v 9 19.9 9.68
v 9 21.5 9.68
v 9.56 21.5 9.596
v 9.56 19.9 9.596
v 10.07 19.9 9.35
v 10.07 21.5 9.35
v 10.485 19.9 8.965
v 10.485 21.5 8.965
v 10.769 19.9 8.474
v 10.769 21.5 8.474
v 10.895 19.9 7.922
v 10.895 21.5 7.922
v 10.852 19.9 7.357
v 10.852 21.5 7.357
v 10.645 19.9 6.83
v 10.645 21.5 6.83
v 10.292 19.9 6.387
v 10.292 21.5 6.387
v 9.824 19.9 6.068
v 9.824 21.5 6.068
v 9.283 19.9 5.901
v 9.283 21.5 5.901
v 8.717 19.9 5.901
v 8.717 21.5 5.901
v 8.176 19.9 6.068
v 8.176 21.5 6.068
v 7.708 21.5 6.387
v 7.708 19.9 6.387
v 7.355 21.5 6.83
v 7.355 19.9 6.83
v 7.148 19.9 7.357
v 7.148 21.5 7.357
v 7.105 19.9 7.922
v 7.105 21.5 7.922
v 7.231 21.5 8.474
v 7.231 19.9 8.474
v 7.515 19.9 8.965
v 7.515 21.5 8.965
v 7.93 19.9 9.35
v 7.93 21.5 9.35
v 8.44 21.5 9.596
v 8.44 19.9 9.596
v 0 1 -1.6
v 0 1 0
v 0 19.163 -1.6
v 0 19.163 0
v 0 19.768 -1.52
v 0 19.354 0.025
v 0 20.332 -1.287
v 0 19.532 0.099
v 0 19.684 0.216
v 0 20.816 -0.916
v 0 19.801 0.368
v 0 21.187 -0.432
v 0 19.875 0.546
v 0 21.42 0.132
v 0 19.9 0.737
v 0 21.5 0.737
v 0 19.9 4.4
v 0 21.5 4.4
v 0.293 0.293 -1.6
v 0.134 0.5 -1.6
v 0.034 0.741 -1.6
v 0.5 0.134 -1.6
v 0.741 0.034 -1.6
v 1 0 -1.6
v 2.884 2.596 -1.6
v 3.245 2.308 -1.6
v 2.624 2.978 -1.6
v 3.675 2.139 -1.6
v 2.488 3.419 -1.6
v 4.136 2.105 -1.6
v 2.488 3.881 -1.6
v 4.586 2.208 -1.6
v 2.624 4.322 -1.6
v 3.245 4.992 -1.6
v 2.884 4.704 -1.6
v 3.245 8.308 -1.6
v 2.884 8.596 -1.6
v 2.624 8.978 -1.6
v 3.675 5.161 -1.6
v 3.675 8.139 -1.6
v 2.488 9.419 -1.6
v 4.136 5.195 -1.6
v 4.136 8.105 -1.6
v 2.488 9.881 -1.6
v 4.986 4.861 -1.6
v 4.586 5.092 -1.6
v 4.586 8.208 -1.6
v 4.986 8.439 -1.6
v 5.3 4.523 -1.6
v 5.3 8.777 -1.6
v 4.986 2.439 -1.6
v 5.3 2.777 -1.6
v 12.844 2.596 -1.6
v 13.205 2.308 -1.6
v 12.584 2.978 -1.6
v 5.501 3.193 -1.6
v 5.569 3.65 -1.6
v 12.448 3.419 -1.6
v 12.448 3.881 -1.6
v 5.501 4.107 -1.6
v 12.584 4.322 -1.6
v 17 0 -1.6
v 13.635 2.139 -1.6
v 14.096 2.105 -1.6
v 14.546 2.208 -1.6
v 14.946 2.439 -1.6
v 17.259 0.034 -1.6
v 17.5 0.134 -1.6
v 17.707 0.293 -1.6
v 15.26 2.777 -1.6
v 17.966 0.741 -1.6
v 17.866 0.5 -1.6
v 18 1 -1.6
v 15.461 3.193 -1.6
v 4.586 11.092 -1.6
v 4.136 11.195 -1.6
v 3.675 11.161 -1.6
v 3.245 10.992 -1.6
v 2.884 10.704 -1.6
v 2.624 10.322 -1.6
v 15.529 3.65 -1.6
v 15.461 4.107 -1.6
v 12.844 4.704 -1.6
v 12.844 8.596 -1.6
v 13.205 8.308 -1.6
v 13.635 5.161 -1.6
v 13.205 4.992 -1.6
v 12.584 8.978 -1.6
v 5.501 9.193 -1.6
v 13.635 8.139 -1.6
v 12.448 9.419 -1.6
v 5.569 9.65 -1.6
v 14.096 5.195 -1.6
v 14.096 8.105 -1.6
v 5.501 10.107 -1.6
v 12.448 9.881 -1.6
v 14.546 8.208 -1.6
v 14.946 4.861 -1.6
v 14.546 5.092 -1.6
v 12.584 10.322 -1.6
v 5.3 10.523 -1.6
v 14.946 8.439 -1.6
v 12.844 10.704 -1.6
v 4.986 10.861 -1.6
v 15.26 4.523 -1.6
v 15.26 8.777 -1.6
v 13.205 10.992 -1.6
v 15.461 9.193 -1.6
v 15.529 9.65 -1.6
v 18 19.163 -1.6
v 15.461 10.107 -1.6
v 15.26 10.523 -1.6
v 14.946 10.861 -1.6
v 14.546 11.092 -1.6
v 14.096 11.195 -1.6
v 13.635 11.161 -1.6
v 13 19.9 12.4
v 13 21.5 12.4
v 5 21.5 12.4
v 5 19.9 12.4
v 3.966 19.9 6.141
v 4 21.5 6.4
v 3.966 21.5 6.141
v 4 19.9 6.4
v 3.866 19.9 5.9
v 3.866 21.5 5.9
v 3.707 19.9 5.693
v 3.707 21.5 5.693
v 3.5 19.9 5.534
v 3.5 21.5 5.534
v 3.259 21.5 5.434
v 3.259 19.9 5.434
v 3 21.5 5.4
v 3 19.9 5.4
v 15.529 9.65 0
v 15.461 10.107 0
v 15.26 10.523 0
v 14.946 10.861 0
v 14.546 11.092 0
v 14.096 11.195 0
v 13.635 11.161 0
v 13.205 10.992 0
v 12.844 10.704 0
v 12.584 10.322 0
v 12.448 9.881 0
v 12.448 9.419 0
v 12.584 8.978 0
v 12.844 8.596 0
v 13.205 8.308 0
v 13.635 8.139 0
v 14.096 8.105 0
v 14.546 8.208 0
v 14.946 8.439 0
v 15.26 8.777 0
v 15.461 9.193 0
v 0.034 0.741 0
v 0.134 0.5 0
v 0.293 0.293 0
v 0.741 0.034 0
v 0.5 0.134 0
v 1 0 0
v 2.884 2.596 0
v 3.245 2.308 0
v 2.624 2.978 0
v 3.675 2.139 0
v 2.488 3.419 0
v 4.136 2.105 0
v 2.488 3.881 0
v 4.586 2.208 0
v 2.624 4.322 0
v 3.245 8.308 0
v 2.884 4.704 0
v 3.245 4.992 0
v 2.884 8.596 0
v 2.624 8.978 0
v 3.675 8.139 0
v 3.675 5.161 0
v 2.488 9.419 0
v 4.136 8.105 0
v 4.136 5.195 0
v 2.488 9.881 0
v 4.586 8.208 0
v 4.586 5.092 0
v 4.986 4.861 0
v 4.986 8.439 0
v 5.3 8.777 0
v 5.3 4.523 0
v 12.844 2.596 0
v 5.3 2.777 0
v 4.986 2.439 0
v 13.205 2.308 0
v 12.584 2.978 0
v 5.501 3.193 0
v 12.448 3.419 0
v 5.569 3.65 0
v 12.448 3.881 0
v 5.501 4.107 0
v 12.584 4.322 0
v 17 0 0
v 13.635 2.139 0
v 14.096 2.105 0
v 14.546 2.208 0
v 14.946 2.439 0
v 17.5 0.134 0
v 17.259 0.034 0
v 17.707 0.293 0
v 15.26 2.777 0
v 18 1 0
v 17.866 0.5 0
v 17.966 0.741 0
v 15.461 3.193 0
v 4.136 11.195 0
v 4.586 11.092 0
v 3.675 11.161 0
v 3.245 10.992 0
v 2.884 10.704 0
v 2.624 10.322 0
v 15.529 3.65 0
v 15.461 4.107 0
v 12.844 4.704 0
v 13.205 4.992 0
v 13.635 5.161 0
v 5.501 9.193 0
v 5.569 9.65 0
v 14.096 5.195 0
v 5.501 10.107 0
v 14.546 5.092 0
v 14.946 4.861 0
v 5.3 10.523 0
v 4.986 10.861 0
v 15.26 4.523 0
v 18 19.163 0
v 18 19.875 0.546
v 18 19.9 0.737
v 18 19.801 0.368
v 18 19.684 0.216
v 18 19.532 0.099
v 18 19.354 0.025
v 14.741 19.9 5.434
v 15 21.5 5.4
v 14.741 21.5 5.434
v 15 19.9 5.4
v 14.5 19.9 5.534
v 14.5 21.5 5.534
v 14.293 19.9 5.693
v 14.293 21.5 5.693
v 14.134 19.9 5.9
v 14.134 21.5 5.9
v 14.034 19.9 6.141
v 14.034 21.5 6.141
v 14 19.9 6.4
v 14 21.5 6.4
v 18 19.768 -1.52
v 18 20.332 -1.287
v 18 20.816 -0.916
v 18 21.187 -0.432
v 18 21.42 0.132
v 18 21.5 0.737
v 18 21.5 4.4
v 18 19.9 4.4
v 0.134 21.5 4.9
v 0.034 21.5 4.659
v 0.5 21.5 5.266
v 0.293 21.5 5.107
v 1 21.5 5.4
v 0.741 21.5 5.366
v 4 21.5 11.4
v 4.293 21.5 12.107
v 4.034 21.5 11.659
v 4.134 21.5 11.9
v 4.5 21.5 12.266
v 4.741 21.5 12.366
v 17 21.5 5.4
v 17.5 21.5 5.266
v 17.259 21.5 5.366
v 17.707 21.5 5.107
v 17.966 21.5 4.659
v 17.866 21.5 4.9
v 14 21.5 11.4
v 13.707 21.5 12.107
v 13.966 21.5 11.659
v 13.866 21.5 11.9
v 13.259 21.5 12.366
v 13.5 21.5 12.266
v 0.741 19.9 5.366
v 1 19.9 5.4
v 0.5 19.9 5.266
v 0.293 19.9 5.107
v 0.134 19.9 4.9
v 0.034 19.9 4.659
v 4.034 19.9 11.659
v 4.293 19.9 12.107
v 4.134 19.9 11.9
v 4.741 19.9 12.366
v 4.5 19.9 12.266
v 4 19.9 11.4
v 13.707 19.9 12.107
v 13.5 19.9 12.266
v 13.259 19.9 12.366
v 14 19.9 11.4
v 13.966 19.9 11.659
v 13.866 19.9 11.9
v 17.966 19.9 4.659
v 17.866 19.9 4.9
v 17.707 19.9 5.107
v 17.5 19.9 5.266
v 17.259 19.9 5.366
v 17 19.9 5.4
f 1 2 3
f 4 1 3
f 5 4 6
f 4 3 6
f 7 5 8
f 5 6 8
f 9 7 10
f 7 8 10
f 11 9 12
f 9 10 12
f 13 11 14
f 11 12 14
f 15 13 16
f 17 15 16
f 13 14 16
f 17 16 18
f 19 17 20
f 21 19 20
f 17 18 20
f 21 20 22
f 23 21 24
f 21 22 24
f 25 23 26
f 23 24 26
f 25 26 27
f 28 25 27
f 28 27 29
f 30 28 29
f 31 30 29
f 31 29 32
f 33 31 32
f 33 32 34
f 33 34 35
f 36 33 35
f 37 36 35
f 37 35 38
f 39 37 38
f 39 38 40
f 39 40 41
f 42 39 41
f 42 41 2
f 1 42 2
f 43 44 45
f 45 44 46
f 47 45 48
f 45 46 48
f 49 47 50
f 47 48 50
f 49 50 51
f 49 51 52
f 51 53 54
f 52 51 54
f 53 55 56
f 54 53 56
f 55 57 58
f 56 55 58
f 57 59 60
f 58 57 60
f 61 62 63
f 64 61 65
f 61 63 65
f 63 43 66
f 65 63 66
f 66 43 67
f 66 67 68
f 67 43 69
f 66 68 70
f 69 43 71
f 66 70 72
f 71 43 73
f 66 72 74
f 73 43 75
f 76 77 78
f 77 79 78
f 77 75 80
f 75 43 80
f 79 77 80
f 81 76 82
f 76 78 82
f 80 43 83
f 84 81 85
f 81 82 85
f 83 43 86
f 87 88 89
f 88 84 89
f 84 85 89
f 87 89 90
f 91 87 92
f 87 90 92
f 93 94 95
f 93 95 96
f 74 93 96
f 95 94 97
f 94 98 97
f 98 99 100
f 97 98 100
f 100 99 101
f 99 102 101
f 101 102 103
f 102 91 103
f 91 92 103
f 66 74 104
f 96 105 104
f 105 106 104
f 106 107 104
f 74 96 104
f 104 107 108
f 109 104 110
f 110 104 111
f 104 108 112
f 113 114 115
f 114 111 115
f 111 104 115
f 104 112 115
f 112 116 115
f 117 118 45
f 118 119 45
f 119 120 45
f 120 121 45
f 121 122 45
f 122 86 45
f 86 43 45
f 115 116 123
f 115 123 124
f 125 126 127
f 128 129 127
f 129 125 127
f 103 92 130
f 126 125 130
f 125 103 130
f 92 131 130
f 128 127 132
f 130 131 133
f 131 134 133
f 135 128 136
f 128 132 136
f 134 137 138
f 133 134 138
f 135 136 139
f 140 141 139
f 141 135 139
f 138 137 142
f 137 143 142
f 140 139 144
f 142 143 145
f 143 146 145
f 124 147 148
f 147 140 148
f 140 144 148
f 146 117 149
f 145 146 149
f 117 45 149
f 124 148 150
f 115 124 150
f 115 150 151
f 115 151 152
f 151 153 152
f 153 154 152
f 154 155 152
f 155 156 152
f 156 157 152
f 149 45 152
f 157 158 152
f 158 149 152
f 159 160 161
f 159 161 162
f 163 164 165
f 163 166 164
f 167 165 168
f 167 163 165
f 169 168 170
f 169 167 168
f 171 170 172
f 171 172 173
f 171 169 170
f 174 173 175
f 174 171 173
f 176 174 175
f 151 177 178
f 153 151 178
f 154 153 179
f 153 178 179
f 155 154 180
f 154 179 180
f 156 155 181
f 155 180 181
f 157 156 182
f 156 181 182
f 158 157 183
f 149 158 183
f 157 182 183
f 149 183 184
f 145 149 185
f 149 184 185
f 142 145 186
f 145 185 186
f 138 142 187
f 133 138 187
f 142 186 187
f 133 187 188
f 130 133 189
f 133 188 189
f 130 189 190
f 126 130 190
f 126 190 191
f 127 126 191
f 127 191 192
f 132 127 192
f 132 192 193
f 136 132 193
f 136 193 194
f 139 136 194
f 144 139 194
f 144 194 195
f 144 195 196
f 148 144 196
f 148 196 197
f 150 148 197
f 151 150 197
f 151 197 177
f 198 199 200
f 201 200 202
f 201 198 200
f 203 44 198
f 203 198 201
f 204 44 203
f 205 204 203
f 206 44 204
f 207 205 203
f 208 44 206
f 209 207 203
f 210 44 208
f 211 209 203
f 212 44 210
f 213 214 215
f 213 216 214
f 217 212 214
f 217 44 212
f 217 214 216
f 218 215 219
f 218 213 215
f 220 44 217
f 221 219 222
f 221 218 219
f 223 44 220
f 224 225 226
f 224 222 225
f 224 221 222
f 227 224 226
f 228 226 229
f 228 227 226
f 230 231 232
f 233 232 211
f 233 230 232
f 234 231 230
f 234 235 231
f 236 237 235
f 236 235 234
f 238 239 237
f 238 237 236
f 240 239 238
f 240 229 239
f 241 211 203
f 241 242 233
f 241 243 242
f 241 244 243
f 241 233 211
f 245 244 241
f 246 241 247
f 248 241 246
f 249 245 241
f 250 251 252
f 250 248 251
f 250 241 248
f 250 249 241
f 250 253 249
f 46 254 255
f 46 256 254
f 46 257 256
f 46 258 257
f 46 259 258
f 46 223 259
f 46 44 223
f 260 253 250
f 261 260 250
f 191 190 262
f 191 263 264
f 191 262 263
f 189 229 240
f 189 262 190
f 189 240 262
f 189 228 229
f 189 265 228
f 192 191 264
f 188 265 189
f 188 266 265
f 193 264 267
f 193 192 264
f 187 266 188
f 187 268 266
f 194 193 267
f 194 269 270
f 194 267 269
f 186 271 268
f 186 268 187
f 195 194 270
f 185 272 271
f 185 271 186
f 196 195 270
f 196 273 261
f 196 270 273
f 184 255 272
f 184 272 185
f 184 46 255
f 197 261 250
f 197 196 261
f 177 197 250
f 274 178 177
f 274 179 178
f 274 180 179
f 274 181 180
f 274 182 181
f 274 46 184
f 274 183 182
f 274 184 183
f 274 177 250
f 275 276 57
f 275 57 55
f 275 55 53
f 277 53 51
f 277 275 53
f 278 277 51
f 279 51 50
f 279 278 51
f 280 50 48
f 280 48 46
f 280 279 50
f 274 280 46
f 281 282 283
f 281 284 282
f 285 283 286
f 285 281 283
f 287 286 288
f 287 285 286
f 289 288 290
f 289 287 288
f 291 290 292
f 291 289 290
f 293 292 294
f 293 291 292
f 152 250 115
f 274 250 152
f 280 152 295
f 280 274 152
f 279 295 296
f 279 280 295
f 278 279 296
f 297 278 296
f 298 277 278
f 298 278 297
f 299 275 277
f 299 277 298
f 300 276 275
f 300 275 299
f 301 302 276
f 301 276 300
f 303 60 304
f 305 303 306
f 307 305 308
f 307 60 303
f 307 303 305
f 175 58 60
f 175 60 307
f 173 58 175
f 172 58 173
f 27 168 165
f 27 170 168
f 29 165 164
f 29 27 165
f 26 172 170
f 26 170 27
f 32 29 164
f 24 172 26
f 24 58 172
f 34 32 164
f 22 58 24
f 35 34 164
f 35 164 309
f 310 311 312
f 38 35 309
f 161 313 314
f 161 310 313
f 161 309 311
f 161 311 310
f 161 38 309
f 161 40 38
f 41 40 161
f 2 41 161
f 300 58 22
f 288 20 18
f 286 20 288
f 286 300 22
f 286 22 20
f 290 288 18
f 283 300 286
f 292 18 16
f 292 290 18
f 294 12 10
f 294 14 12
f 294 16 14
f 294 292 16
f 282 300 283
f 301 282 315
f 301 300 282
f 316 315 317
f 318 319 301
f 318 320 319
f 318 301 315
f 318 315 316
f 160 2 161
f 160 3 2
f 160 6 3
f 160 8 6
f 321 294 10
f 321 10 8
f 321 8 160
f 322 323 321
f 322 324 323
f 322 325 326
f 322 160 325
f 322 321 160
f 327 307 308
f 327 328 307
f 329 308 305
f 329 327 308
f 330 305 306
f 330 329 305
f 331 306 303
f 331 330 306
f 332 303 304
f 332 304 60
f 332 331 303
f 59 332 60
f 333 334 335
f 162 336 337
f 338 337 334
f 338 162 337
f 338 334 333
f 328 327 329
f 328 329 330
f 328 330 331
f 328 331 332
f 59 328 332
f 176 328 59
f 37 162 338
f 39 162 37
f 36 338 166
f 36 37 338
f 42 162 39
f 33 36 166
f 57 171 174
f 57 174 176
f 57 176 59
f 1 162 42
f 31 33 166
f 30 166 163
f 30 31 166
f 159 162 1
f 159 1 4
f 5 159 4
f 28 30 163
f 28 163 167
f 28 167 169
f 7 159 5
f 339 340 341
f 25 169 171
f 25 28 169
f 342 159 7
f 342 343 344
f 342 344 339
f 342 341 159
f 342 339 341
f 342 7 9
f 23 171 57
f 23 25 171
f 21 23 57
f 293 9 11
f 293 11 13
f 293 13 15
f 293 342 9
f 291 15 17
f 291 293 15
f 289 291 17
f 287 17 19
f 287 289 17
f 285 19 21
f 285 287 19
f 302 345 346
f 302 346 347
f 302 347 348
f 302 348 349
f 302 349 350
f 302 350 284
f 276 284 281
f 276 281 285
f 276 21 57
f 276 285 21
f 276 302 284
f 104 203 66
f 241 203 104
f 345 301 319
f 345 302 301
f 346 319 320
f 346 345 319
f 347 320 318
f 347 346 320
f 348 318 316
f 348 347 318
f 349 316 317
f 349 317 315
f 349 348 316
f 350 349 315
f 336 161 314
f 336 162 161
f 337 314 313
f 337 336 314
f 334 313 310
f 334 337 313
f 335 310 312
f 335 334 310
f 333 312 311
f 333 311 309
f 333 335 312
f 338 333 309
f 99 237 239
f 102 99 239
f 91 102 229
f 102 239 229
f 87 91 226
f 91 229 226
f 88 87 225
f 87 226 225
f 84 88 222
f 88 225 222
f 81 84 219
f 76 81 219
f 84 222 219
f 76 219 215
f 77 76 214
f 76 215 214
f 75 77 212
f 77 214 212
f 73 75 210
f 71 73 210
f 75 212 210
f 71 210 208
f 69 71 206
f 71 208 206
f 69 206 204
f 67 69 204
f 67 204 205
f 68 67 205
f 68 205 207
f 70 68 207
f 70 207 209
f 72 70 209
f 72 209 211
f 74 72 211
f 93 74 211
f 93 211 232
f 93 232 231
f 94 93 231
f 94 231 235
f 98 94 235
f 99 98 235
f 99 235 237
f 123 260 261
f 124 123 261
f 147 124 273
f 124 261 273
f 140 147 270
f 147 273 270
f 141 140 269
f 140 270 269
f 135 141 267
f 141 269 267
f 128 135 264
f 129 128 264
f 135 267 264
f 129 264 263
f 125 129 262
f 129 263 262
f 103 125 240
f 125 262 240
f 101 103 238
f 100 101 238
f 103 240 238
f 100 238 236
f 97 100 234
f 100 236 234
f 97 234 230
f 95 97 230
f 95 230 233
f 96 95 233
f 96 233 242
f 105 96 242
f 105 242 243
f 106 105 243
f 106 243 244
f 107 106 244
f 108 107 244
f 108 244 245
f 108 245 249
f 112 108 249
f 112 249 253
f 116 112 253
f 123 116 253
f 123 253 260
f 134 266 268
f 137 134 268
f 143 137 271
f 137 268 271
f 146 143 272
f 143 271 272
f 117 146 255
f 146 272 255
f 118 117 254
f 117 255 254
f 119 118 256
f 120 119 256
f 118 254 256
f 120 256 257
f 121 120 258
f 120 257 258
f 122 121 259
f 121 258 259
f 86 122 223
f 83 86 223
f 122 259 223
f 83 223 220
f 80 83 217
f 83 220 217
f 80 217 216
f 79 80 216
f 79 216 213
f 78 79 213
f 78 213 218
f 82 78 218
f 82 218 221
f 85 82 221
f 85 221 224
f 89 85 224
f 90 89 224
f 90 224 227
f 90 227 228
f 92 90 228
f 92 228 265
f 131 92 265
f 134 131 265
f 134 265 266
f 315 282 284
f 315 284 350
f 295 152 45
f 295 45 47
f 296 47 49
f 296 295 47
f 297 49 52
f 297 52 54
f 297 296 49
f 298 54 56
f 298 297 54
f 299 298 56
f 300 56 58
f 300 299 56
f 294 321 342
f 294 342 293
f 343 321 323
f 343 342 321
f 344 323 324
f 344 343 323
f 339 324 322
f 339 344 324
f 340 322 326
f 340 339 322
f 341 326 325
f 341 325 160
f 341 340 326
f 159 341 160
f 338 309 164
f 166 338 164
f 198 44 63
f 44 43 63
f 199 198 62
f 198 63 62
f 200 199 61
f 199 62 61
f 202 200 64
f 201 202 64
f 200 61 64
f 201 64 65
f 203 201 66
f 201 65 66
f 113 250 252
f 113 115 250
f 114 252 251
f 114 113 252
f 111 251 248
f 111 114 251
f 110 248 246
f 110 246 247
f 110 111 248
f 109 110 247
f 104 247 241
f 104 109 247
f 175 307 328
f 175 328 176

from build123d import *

# Parameters (mm, degrees)
SKETCH2_W                    = 18
SKETCH2_H                    = 21.5
BASE_FLANGE1_DEPTH           = 1.6
EDGE_FLANGE1_STRIP_W         = 7.8732
EDGE_FLANGE1_STRIP_H         = 1.6
EDGE_FLANGE1_STRIP_CUT_DEPTH = 18
EDGE_FLANGE1_DEPTH           = 18
SKETCH10_R                   = 1.9
SKETCH10_W                   = 4
SKETCH10_H                   = 7
CUT_EXTRUDE1_DEPTH           = 10
FILLET1_R                    = 1
SKETCH11_R                   = 1.5494
CUT_EXTRUDE2_DEPTH           = 10


# Sheet-metal steps are written as plain solids
with BuildPart() as part:
    # Sketch2 → Base-Flange1 (new body)
    with BuildSketch(Plane.XY):
        with Locations((9, 10.75)):
            Rectangle(SKETCH2_W, SKETCH2_H)
    extrude(amount=-BASE_FLANGE1_DEPTH)

    # Edge-Flange1 strip (across the edge) → Edge-Flange1 strip cut (cut)
    with BuildSketch(Plane(origin=(18, 21.5, 0), x_dir=(0, -1, 0), z_dir=(-1, 0, 0))):
        with Locations((-1.6, -0.8)):
            Rectangle(EDGE_FLANGE1_STRIP_W, EDGE_FLANGE1_STRIP_H)
    extrude(amount=EDGE_FLANGE1_STRIP_CUT_DEPTH, mode=Mode.SUBTRACT)

    # Edge-Flange1 section (across the edge) → Edge-Flange1 (add)
    with BuildSketch(Plane(origin=(18, 21.5, 0), x_dir=(0, -1, 0), z_dir=(-1, 0, 0))):
        with BuildLine():
            Line((0, 0.7366), (0, 12.4))
            Line((0, 12.4), (1.6, 12.4))
            Line((1.6, 12.4), (1.6, 0.7366))
            ThreePointArc((1.6, 0.7366), (1.815745145, 0.215745145), (2.3366, 0))
            Line((2.3366, 0), (2.3366, -1.6))
            ThreePointArc((2.3366, -1.6), (0.684374295, -0.915625705), (0, 0.7366))
        make_face()
    extrude(amount=EDGE_FLANGE1_DEPTH)

    # Sketch10 → Cut-Extrude1 (cut)
    with BuildSketch(Plane(origin=(0, 21.5, 0), x_dir=(1, 0, 0), z_dir=(0, 1, 0))):
        with Locations(Location((9, -7.78, 0), (0, 0, 270))):
            Circle(SKETCH10_R)
        with Locations((2, -8.9)):
            Rectangle(SKETCH10_W, SKETCH10_H)
        with Locations((16, -8.9)):
            Rectangle(SKETCH10_W, SKETCH10_H)
    extrude(amount=-CUT_EXTRUDE1_DEPTH, mode=Mode.SUBTRACT)

    # Fillet1
    fillet1_edges = [part.edges().sort_by_distance(p)[0] for p in [
        (0, 0, -0.8),
        (18, 0, -0.8),
        (0, 20.7, 5.4),
        (18, 20.7, 5.4),
        (4, 20.7, 5.4),
        (14, 20.7, 5.4),
        (14, 20.7, 12.4),
        (4, 20.7, 12.4),
    ]]
    fillet(fillet1_edges, radius=FILLET1_R)

    # Sketch11 → Cut-Extrude2 (cut)
    with BuildSketch(Plane.XY):
        with Locations((4.02, 9.65)):
            Circle(SKETCH11_R)
        with Locations((13.98, 9.65)):
            Circle(SKETCH11_R)
        with Locations((4.02, 3.65)):
            Circle(SKETCH11_R)
        with Locations((13.98, 3.65)):
            Circle(SKETCH11_R)
    extrude(amount=-CUT_EXTRUDE2_DEPTH, mode=Mode.SUBTRACT)


solid = part.part
